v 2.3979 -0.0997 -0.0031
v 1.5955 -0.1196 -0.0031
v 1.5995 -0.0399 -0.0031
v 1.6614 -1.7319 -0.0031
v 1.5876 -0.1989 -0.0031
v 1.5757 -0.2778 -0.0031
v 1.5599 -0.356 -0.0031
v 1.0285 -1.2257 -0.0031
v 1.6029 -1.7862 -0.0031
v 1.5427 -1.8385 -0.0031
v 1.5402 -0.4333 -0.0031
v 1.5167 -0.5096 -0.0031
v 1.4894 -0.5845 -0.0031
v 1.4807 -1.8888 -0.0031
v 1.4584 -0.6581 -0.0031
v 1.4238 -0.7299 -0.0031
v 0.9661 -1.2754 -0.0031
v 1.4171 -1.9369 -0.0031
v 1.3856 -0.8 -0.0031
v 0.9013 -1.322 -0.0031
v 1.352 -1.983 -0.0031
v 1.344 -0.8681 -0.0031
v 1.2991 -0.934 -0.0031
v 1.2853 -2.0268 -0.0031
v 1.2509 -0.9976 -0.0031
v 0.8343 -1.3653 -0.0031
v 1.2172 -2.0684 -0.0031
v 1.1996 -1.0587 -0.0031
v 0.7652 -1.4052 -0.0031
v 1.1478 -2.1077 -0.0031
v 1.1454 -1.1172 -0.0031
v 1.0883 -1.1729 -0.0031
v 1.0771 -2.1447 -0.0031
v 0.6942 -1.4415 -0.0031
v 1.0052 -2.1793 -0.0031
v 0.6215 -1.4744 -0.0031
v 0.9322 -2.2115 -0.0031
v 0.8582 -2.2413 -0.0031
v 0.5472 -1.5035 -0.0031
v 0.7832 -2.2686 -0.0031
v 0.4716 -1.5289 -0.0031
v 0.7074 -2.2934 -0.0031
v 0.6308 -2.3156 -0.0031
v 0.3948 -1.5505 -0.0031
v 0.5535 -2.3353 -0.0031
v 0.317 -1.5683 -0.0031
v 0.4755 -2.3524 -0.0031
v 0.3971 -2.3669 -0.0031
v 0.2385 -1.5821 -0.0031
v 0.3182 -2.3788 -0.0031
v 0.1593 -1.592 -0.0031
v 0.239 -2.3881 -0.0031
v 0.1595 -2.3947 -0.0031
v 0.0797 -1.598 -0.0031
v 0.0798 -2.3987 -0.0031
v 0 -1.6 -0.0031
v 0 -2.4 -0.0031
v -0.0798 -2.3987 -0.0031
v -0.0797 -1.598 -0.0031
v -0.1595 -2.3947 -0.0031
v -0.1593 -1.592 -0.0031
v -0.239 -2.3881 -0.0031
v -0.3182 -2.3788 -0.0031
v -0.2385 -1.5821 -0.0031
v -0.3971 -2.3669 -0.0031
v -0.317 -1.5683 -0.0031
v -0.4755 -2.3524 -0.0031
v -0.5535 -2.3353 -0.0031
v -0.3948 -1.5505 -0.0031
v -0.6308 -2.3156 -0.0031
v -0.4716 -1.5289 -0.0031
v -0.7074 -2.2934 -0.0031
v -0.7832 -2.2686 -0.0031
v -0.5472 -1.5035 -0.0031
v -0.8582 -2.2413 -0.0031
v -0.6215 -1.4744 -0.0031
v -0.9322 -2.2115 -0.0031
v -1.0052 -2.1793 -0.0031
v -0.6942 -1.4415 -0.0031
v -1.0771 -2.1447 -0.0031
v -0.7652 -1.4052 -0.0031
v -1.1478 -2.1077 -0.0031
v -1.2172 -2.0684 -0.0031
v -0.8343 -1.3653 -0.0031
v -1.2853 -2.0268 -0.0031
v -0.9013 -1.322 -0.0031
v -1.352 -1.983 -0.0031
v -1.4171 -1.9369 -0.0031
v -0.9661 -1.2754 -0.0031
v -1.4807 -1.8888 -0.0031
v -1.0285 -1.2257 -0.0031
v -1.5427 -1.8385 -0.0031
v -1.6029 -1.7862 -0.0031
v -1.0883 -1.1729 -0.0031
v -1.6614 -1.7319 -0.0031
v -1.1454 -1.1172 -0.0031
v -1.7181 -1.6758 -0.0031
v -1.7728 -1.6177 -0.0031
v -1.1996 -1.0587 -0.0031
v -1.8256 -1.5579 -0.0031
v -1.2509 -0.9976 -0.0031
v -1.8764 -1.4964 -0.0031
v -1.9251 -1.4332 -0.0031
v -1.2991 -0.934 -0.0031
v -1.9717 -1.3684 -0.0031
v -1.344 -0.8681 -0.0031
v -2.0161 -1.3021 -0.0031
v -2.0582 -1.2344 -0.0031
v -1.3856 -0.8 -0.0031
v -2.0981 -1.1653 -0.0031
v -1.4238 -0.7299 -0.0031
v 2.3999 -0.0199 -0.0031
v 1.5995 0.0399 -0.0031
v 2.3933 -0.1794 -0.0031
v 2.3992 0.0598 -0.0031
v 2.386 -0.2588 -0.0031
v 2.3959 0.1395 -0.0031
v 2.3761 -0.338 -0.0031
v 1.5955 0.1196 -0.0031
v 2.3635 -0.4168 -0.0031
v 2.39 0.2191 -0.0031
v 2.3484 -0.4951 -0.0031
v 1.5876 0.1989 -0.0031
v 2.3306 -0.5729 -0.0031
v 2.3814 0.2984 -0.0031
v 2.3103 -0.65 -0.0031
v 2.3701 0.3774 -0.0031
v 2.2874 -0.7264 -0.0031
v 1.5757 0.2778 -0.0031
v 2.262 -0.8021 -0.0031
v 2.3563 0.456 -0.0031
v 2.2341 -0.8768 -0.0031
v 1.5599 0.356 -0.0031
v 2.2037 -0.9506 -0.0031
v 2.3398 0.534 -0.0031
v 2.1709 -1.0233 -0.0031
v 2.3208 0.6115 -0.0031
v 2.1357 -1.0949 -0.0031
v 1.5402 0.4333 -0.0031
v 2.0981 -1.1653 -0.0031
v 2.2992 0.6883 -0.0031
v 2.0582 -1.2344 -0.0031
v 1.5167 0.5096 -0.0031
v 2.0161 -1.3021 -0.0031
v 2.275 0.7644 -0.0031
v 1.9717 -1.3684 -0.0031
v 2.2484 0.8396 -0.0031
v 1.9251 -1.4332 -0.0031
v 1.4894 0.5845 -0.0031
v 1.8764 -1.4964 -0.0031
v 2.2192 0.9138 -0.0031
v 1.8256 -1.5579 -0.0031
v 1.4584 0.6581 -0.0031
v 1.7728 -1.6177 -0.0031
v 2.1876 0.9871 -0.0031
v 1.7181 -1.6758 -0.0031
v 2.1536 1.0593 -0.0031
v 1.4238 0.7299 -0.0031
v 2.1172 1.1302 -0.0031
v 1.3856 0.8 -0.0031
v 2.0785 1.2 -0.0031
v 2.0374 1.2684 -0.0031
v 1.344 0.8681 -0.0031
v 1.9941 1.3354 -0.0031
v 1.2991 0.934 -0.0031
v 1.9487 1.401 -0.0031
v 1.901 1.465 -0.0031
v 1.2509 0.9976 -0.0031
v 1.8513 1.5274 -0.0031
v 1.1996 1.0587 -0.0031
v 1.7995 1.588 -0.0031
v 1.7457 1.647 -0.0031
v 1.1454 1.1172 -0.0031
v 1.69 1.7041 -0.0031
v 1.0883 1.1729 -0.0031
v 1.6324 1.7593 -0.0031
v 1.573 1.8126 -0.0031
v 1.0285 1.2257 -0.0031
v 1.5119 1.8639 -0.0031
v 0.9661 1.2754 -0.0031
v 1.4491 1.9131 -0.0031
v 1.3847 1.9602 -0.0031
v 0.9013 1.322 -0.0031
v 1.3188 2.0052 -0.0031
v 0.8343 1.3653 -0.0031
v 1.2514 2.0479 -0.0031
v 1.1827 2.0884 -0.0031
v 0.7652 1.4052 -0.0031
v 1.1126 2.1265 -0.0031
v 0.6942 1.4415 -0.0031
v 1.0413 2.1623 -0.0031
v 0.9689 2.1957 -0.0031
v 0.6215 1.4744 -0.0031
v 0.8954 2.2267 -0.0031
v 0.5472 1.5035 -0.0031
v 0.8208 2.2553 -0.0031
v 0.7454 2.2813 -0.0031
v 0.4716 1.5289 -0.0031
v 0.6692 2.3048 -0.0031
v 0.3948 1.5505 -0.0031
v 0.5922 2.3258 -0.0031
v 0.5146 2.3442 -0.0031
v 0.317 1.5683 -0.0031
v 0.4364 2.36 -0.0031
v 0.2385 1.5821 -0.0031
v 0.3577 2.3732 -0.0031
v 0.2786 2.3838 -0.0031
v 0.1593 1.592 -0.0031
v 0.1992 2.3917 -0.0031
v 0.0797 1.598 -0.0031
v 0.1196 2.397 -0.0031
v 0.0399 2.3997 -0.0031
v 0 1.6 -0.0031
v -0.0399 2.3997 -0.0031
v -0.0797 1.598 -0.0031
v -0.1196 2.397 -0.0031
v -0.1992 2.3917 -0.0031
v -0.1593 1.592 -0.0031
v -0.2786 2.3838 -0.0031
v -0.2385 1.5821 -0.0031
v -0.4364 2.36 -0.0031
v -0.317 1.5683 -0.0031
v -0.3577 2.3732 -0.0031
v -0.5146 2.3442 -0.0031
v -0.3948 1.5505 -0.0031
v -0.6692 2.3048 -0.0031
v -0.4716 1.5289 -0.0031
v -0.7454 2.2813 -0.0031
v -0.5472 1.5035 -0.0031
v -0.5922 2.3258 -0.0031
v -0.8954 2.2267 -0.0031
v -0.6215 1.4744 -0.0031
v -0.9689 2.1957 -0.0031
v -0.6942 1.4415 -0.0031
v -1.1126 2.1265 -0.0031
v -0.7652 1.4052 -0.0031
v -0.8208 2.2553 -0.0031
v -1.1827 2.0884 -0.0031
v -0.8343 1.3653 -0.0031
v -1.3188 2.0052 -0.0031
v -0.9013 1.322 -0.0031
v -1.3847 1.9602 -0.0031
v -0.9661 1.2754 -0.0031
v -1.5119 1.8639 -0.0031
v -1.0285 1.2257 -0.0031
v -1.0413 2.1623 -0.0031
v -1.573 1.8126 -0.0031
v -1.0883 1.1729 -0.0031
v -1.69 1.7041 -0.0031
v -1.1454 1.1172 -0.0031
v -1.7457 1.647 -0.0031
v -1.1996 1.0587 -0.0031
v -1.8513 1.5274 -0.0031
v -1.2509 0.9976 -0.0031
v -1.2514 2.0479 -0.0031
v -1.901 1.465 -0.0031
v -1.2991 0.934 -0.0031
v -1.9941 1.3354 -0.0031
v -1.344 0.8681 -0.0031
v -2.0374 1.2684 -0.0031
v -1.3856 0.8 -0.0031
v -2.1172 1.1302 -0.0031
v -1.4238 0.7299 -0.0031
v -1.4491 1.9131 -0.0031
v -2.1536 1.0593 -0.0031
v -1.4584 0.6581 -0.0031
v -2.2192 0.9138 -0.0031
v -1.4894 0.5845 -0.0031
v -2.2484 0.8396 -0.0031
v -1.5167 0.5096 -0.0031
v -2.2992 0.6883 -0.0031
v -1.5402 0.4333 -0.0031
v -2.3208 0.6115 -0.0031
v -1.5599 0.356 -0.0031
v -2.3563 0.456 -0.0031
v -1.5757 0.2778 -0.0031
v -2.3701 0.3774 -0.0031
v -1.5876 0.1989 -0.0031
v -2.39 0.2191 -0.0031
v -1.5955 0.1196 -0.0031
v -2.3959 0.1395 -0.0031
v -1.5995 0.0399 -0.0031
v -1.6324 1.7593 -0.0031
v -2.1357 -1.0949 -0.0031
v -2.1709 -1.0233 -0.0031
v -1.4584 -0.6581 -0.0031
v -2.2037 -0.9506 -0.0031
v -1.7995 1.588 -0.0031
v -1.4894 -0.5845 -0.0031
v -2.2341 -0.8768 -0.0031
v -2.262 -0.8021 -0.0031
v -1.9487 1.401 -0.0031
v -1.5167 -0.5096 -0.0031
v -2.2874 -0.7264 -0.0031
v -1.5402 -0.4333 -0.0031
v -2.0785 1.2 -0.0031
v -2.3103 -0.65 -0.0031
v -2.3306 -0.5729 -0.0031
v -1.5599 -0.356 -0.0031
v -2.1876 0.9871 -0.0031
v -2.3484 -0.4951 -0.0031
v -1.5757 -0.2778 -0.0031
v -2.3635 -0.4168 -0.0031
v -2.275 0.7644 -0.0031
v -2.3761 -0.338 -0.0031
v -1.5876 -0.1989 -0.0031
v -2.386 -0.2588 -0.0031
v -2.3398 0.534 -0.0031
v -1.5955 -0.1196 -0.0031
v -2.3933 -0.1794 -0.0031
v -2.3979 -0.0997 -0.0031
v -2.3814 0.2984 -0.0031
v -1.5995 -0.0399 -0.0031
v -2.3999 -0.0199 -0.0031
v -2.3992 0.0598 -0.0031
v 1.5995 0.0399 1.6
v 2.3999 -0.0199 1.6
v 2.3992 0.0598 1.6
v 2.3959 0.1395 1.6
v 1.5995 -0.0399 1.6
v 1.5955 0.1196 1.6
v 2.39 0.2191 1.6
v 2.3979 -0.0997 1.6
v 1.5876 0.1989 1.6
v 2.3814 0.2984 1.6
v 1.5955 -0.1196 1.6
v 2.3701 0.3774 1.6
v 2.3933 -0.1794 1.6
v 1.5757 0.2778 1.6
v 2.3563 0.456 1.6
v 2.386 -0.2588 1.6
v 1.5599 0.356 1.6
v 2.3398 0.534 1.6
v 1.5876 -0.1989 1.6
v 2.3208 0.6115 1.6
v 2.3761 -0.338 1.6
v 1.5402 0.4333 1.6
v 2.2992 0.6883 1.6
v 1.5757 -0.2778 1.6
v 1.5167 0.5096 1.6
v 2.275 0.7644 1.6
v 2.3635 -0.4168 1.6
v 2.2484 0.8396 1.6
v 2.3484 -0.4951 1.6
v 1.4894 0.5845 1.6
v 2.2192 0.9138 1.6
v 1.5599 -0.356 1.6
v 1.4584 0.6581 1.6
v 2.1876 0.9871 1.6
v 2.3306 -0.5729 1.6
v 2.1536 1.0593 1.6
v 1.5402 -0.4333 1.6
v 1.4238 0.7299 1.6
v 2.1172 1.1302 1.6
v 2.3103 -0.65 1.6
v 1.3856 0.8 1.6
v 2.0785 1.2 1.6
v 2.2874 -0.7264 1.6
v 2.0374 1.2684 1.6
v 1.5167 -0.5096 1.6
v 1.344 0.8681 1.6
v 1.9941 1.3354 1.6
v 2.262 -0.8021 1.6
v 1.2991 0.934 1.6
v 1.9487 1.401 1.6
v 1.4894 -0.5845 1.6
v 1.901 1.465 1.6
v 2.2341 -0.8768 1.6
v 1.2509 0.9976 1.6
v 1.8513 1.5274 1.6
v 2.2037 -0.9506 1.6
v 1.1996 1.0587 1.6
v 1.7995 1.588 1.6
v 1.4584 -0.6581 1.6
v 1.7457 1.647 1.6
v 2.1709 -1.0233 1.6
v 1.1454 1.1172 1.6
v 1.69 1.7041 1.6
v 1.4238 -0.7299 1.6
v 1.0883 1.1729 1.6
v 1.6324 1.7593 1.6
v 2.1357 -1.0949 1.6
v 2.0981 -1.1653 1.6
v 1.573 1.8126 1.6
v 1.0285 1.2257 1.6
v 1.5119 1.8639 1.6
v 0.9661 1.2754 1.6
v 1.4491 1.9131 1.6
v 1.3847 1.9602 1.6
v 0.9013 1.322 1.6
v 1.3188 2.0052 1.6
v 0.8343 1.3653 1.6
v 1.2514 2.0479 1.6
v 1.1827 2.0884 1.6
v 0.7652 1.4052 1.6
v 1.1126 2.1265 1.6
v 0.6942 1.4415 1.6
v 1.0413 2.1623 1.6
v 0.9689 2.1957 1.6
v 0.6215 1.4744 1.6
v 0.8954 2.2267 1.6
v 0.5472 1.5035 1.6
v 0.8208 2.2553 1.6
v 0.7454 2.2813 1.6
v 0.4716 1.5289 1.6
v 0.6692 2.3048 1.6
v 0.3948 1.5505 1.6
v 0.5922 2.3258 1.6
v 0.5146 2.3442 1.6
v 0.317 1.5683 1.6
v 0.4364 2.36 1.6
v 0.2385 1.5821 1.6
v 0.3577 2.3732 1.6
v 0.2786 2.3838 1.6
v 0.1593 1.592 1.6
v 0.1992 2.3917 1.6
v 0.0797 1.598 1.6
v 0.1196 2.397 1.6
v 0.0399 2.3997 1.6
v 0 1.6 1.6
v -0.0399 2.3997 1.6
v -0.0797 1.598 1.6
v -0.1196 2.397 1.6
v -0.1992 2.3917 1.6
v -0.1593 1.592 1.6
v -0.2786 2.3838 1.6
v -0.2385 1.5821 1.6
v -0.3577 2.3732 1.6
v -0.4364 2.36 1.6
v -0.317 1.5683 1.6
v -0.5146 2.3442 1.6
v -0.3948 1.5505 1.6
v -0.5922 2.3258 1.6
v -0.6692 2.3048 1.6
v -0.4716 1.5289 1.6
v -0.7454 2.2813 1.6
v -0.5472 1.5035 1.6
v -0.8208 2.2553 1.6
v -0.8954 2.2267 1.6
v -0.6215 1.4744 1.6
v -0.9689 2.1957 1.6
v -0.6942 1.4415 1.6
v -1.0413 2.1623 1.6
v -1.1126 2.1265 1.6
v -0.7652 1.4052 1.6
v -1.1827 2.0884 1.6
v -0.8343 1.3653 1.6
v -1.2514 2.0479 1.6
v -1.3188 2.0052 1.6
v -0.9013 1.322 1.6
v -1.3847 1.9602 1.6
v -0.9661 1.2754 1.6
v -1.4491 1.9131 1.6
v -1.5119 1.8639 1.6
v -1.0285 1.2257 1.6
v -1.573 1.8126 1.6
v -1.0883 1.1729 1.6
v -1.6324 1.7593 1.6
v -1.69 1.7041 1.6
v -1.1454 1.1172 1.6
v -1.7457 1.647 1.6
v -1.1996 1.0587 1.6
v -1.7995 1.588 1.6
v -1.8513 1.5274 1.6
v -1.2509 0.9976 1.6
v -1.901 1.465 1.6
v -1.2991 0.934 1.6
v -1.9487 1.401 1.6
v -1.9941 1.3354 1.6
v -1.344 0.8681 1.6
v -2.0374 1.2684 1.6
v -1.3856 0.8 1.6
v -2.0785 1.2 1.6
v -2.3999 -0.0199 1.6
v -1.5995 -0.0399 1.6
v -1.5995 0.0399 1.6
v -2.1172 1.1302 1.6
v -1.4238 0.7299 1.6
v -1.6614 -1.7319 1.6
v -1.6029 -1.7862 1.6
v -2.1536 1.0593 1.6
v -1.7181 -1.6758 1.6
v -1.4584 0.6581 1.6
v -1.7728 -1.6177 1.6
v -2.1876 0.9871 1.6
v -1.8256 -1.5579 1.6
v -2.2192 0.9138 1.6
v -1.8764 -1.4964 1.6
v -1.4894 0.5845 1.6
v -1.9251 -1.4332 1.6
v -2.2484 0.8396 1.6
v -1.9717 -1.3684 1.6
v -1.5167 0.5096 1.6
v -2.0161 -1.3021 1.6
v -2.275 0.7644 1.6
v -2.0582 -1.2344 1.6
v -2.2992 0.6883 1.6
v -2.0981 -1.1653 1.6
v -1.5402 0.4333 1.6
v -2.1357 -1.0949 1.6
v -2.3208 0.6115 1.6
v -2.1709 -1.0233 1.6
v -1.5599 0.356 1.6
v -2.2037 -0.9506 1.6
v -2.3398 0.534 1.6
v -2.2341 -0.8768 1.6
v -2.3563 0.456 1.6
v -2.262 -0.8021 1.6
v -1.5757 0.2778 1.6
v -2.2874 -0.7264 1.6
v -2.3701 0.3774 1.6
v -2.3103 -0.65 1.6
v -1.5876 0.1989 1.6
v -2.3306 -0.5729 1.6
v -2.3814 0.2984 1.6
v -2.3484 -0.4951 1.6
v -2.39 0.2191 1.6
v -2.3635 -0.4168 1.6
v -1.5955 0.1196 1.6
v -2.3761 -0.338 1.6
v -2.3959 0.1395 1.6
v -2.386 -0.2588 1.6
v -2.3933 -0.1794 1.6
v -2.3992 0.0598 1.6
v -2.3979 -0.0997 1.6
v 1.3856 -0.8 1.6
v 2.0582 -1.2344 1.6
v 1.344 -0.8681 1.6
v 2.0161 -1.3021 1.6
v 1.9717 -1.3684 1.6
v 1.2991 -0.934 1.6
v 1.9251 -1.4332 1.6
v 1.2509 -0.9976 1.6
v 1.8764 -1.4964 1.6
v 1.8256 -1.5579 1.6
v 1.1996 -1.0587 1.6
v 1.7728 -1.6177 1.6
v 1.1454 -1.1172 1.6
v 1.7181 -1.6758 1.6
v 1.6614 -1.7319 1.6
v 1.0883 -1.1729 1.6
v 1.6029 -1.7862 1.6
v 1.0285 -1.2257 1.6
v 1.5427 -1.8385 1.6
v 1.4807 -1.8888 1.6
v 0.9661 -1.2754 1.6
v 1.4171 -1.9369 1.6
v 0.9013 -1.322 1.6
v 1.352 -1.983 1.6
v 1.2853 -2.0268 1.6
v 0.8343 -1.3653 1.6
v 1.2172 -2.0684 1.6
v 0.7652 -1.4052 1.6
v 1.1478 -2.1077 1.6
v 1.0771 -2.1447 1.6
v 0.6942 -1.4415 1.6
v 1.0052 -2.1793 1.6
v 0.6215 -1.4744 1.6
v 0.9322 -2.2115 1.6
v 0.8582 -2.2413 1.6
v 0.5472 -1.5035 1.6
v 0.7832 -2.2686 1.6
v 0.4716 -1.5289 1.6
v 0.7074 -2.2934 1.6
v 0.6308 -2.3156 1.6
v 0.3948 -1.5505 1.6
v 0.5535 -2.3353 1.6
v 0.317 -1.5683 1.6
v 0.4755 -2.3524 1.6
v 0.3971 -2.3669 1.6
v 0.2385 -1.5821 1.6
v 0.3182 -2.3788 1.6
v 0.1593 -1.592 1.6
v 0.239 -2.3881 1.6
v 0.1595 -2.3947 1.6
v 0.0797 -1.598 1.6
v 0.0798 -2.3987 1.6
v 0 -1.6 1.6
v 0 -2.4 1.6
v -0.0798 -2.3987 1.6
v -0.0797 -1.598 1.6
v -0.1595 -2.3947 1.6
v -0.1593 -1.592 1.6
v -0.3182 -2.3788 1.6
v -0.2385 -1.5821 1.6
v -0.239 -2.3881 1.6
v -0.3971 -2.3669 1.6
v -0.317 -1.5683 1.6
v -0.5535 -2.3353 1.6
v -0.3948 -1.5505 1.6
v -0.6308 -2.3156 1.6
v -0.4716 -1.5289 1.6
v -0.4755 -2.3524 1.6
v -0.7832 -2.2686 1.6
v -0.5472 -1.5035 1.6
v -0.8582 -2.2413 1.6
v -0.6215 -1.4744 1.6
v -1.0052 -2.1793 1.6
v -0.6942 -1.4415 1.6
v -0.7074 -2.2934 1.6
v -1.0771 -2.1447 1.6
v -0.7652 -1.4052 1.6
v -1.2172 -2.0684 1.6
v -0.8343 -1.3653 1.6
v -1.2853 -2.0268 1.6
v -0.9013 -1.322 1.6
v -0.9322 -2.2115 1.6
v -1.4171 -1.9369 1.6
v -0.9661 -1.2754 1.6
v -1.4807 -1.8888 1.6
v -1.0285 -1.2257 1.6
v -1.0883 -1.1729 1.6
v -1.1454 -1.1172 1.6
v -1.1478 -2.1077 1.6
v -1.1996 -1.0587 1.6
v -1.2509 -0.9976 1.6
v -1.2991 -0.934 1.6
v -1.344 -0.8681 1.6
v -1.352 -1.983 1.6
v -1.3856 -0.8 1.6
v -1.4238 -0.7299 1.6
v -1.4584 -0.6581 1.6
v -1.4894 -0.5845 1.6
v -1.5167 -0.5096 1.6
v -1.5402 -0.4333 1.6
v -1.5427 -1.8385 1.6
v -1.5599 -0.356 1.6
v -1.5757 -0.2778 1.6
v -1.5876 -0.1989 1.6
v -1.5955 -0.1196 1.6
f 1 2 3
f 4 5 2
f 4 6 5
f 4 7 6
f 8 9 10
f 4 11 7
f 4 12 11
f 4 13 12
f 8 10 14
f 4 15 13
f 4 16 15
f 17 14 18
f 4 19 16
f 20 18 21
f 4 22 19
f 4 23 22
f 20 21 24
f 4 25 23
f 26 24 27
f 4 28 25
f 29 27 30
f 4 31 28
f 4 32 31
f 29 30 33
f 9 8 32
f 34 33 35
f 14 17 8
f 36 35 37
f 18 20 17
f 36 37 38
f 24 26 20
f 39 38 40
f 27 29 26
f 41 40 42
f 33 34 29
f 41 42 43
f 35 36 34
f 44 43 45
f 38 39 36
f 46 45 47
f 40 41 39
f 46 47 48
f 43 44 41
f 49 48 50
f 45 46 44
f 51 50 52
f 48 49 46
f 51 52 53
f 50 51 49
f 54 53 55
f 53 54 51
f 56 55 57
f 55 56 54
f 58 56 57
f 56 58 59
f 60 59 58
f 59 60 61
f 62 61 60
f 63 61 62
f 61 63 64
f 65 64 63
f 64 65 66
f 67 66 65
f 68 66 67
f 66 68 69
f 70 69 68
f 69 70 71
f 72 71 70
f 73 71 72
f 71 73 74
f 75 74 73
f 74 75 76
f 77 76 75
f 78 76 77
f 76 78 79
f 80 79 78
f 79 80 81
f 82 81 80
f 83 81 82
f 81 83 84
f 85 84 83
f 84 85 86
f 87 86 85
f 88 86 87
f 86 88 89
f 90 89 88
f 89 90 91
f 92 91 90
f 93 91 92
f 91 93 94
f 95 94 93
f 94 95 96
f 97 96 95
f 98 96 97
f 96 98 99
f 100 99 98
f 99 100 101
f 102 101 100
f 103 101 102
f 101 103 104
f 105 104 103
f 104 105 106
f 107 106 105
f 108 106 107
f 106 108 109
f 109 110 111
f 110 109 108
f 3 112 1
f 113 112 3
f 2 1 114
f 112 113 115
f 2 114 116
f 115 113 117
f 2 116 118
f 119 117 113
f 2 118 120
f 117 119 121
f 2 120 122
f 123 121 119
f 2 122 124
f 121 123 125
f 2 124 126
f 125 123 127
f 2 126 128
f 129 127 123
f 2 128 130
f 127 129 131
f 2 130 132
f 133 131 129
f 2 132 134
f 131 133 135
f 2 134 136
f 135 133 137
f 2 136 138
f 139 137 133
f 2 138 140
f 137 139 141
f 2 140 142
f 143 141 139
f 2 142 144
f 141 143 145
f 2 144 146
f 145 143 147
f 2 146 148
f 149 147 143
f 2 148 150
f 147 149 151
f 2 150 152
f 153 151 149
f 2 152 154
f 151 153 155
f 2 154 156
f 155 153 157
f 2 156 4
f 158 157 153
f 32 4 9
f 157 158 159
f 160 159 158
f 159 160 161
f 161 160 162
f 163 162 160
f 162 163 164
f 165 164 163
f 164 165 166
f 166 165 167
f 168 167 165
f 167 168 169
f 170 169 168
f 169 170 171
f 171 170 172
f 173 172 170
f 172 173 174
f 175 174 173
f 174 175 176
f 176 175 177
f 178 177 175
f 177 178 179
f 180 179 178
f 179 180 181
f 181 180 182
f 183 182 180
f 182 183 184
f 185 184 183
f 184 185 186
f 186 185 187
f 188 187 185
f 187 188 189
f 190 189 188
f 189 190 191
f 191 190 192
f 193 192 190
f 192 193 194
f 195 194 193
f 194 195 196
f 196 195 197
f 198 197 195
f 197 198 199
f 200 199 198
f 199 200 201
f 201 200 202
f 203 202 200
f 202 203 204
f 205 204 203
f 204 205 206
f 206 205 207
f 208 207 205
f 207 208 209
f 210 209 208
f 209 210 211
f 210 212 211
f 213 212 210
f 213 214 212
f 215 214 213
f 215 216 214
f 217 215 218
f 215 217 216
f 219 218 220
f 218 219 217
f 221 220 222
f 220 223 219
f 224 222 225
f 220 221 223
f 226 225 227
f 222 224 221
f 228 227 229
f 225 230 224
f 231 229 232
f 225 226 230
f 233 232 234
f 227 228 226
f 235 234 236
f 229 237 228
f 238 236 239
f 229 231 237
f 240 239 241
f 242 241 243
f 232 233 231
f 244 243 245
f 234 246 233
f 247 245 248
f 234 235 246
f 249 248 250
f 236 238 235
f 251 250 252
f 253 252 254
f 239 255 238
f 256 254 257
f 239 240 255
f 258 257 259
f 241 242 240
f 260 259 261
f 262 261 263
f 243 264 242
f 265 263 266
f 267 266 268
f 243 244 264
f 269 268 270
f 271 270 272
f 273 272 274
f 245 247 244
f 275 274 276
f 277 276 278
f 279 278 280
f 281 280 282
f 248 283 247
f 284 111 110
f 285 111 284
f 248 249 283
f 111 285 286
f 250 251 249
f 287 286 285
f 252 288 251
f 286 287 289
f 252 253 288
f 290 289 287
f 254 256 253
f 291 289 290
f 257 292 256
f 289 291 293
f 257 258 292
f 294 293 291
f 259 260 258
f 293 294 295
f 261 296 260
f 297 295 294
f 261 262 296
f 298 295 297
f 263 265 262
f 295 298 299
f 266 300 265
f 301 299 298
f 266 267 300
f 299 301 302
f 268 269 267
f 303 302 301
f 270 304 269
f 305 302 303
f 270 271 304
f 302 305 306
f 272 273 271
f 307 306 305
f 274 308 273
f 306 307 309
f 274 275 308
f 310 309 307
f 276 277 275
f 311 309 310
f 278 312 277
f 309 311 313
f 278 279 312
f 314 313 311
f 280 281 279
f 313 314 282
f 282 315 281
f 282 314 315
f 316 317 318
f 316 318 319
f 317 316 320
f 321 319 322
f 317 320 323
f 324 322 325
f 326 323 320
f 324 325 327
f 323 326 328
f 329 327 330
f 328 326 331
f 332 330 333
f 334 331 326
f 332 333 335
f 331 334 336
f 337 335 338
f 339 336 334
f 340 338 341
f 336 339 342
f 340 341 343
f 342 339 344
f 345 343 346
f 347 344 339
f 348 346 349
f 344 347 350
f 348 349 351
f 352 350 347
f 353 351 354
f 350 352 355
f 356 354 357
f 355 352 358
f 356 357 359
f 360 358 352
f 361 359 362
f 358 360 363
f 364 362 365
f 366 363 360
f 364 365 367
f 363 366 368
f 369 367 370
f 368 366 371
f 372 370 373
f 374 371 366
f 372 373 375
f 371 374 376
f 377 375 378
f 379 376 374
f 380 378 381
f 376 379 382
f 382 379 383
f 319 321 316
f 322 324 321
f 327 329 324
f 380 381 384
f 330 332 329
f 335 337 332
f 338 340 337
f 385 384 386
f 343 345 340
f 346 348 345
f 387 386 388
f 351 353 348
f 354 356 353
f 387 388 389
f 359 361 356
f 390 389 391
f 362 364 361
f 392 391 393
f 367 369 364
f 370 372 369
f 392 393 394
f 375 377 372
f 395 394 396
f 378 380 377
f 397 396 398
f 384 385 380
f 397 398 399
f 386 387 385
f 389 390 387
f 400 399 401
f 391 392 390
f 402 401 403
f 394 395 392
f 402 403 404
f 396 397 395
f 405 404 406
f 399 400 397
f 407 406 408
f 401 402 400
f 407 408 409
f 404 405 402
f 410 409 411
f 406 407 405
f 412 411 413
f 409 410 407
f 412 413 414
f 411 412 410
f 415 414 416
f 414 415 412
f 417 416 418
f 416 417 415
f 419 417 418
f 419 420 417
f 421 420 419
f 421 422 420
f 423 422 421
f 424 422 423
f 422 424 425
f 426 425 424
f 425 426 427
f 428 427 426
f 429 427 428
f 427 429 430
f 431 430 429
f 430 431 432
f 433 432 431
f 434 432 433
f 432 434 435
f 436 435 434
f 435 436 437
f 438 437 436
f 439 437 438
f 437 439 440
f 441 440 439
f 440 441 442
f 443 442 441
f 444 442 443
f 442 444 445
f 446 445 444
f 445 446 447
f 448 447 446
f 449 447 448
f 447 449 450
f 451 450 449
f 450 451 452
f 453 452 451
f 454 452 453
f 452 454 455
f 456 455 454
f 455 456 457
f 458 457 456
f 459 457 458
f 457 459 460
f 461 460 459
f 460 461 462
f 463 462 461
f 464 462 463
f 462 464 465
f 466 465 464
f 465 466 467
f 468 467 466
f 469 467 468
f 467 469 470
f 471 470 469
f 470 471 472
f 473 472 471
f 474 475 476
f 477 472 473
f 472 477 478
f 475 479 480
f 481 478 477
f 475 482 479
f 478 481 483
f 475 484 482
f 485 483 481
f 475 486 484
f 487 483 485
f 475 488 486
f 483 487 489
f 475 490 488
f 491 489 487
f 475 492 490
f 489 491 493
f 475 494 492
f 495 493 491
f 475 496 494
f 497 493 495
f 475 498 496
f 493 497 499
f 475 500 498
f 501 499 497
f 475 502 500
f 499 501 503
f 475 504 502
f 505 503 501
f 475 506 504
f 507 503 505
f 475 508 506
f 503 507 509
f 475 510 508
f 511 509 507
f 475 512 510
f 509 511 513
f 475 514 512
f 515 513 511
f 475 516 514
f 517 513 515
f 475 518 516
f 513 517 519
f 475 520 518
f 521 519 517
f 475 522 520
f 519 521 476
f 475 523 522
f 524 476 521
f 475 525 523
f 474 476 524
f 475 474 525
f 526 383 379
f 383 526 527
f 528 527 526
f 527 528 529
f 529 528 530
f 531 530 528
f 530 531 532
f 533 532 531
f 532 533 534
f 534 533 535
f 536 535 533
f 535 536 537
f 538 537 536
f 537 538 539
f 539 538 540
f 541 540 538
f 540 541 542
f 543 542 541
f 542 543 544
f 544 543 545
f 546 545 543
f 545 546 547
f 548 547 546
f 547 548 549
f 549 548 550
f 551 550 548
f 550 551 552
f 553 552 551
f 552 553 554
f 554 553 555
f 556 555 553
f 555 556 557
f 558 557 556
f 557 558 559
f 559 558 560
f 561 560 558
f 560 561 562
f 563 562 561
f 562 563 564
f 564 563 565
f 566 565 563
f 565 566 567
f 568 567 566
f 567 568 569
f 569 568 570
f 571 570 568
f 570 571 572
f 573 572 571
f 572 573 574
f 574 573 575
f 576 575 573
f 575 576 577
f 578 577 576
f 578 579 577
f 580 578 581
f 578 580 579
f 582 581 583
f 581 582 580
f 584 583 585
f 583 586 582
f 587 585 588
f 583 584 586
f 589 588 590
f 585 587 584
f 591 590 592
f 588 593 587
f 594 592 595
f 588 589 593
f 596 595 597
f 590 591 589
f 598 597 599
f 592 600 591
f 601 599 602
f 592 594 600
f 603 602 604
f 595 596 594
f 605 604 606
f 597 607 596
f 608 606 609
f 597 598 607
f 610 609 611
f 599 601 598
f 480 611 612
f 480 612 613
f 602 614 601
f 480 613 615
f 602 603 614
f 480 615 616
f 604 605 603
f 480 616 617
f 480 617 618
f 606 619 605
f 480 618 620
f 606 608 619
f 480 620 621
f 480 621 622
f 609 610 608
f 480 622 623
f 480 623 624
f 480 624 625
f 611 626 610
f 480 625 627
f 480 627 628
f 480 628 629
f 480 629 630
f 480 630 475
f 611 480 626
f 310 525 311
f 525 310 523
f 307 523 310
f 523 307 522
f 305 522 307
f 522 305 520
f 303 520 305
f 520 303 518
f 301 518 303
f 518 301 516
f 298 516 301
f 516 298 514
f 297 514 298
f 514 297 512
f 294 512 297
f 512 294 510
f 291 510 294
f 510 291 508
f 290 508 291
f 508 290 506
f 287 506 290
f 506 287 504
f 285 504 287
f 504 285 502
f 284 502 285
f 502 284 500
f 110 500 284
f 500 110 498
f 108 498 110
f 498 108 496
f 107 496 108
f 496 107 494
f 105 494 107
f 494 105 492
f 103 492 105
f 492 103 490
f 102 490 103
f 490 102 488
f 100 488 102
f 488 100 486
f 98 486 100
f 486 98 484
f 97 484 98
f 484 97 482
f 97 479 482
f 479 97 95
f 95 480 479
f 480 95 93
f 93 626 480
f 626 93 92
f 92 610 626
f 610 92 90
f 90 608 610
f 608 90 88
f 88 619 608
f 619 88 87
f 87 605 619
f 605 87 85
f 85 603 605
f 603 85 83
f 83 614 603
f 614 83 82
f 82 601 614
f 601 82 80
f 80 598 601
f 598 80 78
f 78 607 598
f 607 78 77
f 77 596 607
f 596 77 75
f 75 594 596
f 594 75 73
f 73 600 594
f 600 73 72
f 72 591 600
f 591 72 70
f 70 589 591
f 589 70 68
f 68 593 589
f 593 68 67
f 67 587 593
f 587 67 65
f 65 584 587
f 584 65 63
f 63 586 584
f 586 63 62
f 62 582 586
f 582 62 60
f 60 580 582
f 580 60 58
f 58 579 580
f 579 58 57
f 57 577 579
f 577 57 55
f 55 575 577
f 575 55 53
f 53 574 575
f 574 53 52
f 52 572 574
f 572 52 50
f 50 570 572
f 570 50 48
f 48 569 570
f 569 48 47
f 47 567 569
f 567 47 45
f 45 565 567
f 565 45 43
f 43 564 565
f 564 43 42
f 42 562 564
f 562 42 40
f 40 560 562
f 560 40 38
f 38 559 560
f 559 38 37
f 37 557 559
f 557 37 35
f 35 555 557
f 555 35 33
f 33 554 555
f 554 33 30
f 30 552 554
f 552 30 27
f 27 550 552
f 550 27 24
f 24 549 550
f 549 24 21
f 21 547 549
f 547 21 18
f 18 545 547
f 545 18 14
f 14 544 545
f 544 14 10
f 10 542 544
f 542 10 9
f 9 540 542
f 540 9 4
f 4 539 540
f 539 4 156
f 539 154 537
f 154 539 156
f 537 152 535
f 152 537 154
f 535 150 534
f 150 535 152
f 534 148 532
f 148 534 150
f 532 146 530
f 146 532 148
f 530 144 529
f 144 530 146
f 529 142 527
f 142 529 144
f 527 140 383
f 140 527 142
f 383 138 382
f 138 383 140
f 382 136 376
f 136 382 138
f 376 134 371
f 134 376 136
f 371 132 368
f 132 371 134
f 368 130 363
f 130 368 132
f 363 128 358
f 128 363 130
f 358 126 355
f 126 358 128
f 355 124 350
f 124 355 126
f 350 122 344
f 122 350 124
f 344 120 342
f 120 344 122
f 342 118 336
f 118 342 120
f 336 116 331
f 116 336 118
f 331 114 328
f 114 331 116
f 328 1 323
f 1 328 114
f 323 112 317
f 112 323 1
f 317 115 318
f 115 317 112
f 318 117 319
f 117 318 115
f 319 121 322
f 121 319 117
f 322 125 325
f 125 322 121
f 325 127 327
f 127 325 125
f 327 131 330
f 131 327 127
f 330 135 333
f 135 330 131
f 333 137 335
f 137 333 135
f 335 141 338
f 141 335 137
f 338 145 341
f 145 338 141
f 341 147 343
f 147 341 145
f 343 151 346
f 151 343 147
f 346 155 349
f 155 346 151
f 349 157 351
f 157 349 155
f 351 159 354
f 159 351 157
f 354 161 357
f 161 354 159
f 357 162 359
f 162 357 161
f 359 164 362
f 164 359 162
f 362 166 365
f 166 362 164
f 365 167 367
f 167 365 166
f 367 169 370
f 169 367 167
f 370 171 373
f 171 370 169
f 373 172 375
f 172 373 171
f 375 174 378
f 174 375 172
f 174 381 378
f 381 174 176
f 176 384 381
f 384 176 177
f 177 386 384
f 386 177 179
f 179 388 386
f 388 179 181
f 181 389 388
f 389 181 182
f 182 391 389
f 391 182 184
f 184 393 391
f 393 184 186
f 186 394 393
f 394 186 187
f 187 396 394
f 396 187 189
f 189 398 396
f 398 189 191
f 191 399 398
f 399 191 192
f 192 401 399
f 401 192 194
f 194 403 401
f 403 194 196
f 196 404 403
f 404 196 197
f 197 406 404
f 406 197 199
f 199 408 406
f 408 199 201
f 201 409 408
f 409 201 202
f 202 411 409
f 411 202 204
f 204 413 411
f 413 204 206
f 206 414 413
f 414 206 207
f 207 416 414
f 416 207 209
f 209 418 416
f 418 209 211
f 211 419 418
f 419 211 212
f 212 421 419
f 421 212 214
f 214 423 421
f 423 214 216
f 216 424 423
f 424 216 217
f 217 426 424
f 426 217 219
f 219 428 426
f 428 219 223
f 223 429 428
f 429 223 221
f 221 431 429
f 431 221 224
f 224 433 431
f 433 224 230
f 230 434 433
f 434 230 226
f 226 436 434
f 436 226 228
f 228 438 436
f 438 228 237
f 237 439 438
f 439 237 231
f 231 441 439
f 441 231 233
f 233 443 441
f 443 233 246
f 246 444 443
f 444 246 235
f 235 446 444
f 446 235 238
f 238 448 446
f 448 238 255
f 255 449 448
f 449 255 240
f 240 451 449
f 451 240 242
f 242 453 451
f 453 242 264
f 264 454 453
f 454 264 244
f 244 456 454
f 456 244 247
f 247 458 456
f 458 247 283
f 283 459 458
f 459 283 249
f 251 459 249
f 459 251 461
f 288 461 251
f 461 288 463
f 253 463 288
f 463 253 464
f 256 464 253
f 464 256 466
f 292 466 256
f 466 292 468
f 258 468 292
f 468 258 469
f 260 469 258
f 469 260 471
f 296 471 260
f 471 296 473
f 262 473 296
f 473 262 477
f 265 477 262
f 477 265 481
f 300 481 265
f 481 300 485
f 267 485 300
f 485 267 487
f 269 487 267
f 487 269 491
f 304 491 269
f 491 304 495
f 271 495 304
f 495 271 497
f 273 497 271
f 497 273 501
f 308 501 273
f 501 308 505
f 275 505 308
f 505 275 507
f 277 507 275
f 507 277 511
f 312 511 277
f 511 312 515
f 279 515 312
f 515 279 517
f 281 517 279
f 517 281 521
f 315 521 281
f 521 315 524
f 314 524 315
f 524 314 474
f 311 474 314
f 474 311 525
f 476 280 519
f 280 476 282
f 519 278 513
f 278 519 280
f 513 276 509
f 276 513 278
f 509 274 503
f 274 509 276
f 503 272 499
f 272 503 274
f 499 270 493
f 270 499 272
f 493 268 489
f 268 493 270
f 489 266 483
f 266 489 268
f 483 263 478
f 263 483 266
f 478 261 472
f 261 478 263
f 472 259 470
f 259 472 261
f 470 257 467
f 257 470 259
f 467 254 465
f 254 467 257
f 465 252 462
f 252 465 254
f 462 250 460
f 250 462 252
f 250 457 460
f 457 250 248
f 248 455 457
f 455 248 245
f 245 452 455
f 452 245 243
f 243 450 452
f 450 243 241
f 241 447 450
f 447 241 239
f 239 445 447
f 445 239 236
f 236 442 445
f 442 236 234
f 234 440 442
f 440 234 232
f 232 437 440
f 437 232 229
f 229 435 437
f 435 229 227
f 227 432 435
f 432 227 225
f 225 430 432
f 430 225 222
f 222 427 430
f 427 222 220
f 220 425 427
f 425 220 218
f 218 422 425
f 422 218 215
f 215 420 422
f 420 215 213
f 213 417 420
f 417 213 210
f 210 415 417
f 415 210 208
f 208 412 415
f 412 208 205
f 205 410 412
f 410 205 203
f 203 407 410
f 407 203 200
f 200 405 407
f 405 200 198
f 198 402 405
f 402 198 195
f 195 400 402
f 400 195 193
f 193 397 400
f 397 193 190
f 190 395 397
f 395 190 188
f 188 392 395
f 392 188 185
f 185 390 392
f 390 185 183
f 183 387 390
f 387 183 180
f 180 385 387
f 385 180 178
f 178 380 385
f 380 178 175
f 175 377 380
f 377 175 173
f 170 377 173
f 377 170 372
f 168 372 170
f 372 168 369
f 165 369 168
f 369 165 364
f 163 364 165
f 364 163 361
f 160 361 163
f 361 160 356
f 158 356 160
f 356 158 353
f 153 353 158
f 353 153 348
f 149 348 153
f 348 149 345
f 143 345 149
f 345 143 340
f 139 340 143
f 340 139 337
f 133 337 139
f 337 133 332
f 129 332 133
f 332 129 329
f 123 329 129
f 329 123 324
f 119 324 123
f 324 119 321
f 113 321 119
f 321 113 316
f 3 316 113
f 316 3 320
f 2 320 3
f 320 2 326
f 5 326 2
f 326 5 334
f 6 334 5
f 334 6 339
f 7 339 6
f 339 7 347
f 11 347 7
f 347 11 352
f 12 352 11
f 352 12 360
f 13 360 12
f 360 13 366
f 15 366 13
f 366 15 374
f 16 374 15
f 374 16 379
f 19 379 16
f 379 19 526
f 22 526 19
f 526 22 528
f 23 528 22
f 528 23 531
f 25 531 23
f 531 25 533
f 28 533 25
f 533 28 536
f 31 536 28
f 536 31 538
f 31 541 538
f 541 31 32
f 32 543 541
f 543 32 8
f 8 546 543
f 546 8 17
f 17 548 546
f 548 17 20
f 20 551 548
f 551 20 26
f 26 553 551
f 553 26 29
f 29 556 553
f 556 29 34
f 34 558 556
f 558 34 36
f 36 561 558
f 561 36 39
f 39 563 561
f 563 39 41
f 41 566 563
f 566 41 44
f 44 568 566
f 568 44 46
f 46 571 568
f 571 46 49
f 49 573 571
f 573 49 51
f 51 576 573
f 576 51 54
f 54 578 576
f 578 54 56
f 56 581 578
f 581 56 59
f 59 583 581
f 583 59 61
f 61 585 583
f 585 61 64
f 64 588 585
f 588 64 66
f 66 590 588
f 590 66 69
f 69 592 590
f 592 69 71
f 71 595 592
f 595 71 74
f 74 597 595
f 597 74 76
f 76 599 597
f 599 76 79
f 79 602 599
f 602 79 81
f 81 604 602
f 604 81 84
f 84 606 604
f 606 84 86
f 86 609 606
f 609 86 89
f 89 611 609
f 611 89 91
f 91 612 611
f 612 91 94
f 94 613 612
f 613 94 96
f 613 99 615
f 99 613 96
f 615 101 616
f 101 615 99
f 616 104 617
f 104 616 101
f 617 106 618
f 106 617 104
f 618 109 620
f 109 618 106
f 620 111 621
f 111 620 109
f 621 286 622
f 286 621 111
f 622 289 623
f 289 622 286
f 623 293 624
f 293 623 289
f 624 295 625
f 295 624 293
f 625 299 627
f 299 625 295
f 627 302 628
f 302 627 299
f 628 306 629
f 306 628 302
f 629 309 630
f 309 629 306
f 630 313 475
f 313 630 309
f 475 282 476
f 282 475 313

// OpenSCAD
use <../lib.scad>
use <s/58381s01.scad>
use <../p/stud2.scad>
$fa=1; $fs=0.2;
function ldraw_lib__58381(realsolid=false) = [
// 0 Door  1 x  3 x  4 Left with Hollow Hinge
// 0 Name: 58381.dat
// 0 Author: Rolf Osterthun [Rolf]
// 0 !LDRAW_ORG Part UPDATE 2011-01
// 0 !LICENSE Licensed under CC BY 2.0 and CC BY 4.0 : see CAreadme.txt
// 
// 0 BFC CERTIFY CCW
  [0,"BFC","CERTIFY"],
  [0,"BFC","CCW"],
// 
// 0 !HISTORY 2009-10-13 {LEGO Universe Team} Original part shape
// 0 !HISTORY 2010-09-14 [Rolf] File preparation for LDraw Parts Tracker
// 0 !HISTORY 2011-07-25 [PTadmin] Official Update 2011-01
// 
// 
// 1 16 0 0 0 1 0 0 0 1 0 0 0 1 s\58381s01.dat
  [1,16,0,0,0,1,0,0,0,1,0,0,0,1, ldraw_lib__s__58381s01(realsolid)],
// 1 16 0 0 0 1 0 0 0 1 0 0 0 1 stud2.dat
  [1,16,0,0,0,1,0,0,0,1,0,0,0,1, ldraw_lib__stud2(realsolid)],
// 0 //
];
module ldraw_lib__58381(step=0, col=false, unit=2/5, alt=false, line=0.2, solid=!$preview)
    makepoly(ldraw_lib__58381(solid), step=step, col=col, unit=unit, alt=alt, line=line, solid=solid);
ldraw_lib__58381(line=0.2);
